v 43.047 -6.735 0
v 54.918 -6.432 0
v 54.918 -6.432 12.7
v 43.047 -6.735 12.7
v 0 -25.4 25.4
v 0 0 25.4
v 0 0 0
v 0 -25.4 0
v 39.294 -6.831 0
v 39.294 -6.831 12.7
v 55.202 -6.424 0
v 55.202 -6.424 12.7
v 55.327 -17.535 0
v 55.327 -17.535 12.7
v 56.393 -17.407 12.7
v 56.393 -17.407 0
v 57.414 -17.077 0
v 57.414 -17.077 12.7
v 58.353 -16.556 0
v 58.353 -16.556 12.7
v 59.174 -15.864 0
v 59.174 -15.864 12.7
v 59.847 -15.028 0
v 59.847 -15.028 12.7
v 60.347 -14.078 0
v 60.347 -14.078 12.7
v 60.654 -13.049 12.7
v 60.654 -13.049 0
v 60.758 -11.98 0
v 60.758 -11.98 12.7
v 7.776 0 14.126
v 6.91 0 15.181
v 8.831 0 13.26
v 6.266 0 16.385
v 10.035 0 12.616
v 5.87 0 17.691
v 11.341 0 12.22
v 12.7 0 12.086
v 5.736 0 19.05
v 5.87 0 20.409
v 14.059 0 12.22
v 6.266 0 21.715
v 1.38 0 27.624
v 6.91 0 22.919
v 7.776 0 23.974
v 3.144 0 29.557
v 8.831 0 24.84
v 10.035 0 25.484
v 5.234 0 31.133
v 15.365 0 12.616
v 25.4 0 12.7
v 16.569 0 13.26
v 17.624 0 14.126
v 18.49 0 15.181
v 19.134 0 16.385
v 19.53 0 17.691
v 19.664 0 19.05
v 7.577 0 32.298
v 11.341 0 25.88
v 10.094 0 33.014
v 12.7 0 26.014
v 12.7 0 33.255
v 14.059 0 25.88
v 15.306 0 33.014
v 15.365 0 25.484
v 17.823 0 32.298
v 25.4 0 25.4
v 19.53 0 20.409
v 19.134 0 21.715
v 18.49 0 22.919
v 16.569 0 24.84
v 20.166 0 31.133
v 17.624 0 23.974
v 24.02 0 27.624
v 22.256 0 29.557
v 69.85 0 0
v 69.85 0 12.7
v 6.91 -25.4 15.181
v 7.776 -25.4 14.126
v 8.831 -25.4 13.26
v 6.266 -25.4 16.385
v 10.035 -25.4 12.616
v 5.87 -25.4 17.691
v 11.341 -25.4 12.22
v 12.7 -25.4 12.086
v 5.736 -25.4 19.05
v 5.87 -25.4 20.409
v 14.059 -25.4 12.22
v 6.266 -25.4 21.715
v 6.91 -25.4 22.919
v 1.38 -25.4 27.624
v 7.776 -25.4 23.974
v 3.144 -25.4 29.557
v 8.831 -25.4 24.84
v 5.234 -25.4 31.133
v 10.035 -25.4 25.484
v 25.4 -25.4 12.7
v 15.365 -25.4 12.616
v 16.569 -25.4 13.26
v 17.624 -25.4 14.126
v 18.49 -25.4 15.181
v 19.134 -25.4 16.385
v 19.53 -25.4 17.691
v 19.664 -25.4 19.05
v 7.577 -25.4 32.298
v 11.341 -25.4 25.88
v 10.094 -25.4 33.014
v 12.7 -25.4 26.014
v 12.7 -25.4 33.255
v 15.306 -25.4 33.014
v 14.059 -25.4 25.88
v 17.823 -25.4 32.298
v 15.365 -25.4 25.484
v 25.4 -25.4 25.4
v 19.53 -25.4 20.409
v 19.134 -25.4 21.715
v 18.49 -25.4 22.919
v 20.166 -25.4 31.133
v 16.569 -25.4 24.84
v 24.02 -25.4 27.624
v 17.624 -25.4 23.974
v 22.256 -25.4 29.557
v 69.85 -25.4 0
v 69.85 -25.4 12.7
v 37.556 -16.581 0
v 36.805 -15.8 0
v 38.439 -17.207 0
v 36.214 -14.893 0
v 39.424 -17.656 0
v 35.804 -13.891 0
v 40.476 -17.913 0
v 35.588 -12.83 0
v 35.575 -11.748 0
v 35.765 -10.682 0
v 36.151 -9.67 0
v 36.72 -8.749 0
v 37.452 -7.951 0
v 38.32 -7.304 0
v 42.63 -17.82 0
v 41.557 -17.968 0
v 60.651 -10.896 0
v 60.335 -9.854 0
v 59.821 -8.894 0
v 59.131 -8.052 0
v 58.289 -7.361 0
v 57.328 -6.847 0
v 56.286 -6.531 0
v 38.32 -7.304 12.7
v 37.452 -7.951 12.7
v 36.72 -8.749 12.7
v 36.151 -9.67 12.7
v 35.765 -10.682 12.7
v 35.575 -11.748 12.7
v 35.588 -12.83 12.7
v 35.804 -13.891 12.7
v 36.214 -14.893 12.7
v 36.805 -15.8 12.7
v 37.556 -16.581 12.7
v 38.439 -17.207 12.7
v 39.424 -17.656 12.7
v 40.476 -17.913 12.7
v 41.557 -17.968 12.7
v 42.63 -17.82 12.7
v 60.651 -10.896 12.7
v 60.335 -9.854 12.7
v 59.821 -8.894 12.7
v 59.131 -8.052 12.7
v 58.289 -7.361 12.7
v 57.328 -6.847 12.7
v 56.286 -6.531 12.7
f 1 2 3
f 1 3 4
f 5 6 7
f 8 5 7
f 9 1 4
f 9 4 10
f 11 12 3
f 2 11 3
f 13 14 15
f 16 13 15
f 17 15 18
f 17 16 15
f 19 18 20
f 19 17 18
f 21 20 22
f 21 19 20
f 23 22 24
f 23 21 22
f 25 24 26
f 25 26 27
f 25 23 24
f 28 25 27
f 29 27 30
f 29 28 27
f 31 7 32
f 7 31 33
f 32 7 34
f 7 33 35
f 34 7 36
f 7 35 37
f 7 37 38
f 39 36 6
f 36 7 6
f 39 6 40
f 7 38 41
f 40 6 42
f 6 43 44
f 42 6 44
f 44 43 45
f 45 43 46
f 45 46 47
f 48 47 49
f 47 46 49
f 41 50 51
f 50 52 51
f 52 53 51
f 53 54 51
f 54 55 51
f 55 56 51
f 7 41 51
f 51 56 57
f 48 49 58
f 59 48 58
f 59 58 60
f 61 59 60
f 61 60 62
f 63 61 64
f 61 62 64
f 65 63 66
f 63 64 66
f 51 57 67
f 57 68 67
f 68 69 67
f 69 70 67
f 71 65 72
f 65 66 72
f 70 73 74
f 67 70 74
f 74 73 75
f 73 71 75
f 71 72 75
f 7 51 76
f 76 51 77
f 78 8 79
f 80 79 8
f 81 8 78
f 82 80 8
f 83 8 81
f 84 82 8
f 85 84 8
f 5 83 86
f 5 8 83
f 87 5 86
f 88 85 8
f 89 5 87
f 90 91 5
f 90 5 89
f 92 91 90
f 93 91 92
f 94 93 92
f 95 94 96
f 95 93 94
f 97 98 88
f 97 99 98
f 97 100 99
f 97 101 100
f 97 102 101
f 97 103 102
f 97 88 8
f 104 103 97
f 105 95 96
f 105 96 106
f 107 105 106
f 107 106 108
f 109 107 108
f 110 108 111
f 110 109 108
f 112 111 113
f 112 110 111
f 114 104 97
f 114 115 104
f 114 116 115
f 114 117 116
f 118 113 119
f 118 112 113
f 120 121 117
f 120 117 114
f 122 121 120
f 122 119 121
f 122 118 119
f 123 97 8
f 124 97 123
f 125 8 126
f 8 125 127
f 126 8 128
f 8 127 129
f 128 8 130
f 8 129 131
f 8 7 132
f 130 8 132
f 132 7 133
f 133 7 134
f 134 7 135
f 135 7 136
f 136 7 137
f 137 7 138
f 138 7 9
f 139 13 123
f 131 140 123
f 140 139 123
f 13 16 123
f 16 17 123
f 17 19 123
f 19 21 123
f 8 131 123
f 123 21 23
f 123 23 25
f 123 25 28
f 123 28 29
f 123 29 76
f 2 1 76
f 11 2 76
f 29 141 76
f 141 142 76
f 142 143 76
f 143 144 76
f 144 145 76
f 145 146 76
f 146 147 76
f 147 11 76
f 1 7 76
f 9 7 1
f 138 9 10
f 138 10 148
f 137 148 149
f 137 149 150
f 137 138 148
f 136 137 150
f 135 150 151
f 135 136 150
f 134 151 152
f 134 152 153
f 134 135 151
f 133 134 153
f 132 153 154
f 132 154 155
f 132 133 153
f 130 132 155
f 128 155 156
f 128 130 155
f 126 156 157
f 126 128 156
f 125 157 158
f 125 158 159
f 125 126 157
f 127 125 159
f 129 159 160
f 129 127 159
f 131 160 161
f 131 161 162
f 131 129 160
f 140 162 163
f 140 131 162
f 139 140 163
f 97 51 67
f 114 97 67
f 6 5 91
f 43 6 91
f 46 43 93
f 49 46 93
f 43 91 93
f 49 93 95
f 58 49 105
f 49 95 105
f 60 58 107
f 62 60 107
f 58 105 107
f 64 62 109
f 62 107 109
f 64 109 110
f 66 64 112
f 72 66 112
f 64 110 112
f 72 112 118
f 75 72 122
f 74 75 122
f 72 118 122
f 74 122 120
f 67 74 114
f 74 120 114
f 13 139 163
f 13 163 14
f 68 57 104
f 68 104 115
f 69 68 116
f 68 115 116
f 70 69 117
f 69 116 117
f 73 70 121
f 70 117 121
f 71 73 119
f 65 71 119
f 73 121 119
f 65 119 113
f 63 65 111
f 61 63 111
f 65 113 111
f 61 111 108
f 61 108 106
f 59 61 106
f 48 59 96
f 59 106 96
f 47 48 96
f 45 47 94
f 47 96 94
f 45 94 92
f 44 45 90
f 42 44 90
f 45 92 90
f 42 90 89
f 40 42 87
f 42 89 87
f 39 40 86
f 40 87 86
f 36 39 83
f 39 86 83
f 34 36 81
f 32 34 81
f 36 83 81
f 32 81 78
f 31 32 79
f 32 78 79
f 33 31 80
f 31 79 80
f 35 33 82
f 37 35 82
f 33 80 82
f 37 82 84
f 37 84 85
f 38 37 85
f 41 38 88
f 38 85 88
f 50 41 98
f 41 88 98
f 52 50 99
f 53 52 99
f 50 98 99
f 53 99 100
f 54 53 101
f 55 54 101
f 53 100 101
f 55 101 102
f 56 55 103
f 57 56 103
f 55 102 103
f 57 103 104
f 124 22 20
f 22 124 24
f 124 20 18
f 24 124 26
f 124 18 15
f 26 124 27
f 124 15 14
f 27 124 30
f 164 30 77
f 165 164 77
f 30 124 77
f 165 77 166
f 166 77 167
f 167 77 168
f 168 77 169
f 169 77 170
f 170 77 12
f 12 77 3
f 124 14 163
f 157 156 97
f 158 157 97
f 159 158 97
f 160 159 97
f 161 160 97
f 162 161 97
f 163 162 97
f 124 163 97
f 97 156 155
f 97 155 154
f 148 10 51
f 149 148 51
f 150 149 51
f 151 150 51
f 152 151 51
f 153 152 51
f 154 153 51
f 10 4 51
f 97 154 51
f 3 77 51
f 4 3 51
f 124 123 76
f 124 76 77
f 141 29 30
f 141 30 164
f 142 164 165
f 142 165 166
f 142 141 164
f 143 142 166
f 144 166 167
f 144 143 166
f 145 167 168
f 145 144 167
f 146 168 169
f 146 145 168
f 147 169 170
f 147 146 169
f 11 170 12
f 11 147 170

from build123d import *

# Parameters (mm, degrees)
F1_DEPTH = 25.4
F2_R     = 6.963826
F3_DEPTH = 25.4
F5_DEPTH = 12.7


with BuildPart() as f1:
    # F0 (on Front) → F1 (new body)
    with BuildSketch(Plane.XZ):
        Polygon((0, 38.1), (0, 0), (69.85, 0), (69.85, 12.7), (25.4, 12.7), (25.4, 38.1), align=None)
    extrude(amount=F1_DEPTH)

    # F2 (on face) → F3 (cut)
    with BuildSketch(Plane.XZ.offset(25.4)):
        with Locations((12.7, 19.05)):
            Circle(F2_R)
        with BuildLine():
            ThreePointArc((0, 25.4), (12.7, 33.255156), (25.4, 25.4))
            Line((25.4, 25.4), (25.4, 38.1))
            Line((25.4, 38.1), (0, 38.1))
            Line((0, 38.1), (0, 25.4))
        make_face()
    extrude(amount=-F3_DEPTH, mode=Mode.SUBTRACT)

    # F4 (on Top) → F5 (cut)
    with BuildSketch(Plane.XY):
        with BuildLine():
            ThreePointArc((47.063009, -12.219809), (45.820597, -15.790974), (42.629922, -17.819863))
            Line((42.629922, -17.819863), (55.326719, -17.534672))
            ThreePointArc((55.326719, -17.534672), (49.649912, -12.184477), (54.918351, -6.431715))
            Line((54.918351, -6.431715), (43.04726, -6.734904))
            ThreePointArc((43.04726, -6.734904), (45.951759, -8.820897), (47.063009, -12.219809))
        make_face()
        with BuildLine():
            ThreePointArc((54.918351, -6.431715), (49.649912, -12.184477), (55.326719, -17.534672))
            ThreePointArc((55.326719, -17.534672), (59.174368, -15.864457), (60.757759, -11.980272))
            ThreePointArc((60.757759, -11.980272), (59.130503, -8.051728), (55.201958, -6.424471))
            Line((55.201958, -6.424471), (54.918351, -6.431715))
        make_face()
        with BuildLine():
            Line((43.04726, -6.734904), (39.293736, -6.83077))
            ThreePointArc((39.293736, -6.83077), (35.803833, -13.891235), (42.629922, -17.819863))
            ThreePointArc((42.629922, -17.819863), (45.820597, -15.790974), (47.063009, -12.219809))
            ThreePointArc((47.063009, -12.219809), (45.951759, -8.820897), (43.04726, -6.734904))
        make_face()
    extrude(amount=F5_DEPTH, mode=Mode.SUBTRACT)


solid = f1.part
